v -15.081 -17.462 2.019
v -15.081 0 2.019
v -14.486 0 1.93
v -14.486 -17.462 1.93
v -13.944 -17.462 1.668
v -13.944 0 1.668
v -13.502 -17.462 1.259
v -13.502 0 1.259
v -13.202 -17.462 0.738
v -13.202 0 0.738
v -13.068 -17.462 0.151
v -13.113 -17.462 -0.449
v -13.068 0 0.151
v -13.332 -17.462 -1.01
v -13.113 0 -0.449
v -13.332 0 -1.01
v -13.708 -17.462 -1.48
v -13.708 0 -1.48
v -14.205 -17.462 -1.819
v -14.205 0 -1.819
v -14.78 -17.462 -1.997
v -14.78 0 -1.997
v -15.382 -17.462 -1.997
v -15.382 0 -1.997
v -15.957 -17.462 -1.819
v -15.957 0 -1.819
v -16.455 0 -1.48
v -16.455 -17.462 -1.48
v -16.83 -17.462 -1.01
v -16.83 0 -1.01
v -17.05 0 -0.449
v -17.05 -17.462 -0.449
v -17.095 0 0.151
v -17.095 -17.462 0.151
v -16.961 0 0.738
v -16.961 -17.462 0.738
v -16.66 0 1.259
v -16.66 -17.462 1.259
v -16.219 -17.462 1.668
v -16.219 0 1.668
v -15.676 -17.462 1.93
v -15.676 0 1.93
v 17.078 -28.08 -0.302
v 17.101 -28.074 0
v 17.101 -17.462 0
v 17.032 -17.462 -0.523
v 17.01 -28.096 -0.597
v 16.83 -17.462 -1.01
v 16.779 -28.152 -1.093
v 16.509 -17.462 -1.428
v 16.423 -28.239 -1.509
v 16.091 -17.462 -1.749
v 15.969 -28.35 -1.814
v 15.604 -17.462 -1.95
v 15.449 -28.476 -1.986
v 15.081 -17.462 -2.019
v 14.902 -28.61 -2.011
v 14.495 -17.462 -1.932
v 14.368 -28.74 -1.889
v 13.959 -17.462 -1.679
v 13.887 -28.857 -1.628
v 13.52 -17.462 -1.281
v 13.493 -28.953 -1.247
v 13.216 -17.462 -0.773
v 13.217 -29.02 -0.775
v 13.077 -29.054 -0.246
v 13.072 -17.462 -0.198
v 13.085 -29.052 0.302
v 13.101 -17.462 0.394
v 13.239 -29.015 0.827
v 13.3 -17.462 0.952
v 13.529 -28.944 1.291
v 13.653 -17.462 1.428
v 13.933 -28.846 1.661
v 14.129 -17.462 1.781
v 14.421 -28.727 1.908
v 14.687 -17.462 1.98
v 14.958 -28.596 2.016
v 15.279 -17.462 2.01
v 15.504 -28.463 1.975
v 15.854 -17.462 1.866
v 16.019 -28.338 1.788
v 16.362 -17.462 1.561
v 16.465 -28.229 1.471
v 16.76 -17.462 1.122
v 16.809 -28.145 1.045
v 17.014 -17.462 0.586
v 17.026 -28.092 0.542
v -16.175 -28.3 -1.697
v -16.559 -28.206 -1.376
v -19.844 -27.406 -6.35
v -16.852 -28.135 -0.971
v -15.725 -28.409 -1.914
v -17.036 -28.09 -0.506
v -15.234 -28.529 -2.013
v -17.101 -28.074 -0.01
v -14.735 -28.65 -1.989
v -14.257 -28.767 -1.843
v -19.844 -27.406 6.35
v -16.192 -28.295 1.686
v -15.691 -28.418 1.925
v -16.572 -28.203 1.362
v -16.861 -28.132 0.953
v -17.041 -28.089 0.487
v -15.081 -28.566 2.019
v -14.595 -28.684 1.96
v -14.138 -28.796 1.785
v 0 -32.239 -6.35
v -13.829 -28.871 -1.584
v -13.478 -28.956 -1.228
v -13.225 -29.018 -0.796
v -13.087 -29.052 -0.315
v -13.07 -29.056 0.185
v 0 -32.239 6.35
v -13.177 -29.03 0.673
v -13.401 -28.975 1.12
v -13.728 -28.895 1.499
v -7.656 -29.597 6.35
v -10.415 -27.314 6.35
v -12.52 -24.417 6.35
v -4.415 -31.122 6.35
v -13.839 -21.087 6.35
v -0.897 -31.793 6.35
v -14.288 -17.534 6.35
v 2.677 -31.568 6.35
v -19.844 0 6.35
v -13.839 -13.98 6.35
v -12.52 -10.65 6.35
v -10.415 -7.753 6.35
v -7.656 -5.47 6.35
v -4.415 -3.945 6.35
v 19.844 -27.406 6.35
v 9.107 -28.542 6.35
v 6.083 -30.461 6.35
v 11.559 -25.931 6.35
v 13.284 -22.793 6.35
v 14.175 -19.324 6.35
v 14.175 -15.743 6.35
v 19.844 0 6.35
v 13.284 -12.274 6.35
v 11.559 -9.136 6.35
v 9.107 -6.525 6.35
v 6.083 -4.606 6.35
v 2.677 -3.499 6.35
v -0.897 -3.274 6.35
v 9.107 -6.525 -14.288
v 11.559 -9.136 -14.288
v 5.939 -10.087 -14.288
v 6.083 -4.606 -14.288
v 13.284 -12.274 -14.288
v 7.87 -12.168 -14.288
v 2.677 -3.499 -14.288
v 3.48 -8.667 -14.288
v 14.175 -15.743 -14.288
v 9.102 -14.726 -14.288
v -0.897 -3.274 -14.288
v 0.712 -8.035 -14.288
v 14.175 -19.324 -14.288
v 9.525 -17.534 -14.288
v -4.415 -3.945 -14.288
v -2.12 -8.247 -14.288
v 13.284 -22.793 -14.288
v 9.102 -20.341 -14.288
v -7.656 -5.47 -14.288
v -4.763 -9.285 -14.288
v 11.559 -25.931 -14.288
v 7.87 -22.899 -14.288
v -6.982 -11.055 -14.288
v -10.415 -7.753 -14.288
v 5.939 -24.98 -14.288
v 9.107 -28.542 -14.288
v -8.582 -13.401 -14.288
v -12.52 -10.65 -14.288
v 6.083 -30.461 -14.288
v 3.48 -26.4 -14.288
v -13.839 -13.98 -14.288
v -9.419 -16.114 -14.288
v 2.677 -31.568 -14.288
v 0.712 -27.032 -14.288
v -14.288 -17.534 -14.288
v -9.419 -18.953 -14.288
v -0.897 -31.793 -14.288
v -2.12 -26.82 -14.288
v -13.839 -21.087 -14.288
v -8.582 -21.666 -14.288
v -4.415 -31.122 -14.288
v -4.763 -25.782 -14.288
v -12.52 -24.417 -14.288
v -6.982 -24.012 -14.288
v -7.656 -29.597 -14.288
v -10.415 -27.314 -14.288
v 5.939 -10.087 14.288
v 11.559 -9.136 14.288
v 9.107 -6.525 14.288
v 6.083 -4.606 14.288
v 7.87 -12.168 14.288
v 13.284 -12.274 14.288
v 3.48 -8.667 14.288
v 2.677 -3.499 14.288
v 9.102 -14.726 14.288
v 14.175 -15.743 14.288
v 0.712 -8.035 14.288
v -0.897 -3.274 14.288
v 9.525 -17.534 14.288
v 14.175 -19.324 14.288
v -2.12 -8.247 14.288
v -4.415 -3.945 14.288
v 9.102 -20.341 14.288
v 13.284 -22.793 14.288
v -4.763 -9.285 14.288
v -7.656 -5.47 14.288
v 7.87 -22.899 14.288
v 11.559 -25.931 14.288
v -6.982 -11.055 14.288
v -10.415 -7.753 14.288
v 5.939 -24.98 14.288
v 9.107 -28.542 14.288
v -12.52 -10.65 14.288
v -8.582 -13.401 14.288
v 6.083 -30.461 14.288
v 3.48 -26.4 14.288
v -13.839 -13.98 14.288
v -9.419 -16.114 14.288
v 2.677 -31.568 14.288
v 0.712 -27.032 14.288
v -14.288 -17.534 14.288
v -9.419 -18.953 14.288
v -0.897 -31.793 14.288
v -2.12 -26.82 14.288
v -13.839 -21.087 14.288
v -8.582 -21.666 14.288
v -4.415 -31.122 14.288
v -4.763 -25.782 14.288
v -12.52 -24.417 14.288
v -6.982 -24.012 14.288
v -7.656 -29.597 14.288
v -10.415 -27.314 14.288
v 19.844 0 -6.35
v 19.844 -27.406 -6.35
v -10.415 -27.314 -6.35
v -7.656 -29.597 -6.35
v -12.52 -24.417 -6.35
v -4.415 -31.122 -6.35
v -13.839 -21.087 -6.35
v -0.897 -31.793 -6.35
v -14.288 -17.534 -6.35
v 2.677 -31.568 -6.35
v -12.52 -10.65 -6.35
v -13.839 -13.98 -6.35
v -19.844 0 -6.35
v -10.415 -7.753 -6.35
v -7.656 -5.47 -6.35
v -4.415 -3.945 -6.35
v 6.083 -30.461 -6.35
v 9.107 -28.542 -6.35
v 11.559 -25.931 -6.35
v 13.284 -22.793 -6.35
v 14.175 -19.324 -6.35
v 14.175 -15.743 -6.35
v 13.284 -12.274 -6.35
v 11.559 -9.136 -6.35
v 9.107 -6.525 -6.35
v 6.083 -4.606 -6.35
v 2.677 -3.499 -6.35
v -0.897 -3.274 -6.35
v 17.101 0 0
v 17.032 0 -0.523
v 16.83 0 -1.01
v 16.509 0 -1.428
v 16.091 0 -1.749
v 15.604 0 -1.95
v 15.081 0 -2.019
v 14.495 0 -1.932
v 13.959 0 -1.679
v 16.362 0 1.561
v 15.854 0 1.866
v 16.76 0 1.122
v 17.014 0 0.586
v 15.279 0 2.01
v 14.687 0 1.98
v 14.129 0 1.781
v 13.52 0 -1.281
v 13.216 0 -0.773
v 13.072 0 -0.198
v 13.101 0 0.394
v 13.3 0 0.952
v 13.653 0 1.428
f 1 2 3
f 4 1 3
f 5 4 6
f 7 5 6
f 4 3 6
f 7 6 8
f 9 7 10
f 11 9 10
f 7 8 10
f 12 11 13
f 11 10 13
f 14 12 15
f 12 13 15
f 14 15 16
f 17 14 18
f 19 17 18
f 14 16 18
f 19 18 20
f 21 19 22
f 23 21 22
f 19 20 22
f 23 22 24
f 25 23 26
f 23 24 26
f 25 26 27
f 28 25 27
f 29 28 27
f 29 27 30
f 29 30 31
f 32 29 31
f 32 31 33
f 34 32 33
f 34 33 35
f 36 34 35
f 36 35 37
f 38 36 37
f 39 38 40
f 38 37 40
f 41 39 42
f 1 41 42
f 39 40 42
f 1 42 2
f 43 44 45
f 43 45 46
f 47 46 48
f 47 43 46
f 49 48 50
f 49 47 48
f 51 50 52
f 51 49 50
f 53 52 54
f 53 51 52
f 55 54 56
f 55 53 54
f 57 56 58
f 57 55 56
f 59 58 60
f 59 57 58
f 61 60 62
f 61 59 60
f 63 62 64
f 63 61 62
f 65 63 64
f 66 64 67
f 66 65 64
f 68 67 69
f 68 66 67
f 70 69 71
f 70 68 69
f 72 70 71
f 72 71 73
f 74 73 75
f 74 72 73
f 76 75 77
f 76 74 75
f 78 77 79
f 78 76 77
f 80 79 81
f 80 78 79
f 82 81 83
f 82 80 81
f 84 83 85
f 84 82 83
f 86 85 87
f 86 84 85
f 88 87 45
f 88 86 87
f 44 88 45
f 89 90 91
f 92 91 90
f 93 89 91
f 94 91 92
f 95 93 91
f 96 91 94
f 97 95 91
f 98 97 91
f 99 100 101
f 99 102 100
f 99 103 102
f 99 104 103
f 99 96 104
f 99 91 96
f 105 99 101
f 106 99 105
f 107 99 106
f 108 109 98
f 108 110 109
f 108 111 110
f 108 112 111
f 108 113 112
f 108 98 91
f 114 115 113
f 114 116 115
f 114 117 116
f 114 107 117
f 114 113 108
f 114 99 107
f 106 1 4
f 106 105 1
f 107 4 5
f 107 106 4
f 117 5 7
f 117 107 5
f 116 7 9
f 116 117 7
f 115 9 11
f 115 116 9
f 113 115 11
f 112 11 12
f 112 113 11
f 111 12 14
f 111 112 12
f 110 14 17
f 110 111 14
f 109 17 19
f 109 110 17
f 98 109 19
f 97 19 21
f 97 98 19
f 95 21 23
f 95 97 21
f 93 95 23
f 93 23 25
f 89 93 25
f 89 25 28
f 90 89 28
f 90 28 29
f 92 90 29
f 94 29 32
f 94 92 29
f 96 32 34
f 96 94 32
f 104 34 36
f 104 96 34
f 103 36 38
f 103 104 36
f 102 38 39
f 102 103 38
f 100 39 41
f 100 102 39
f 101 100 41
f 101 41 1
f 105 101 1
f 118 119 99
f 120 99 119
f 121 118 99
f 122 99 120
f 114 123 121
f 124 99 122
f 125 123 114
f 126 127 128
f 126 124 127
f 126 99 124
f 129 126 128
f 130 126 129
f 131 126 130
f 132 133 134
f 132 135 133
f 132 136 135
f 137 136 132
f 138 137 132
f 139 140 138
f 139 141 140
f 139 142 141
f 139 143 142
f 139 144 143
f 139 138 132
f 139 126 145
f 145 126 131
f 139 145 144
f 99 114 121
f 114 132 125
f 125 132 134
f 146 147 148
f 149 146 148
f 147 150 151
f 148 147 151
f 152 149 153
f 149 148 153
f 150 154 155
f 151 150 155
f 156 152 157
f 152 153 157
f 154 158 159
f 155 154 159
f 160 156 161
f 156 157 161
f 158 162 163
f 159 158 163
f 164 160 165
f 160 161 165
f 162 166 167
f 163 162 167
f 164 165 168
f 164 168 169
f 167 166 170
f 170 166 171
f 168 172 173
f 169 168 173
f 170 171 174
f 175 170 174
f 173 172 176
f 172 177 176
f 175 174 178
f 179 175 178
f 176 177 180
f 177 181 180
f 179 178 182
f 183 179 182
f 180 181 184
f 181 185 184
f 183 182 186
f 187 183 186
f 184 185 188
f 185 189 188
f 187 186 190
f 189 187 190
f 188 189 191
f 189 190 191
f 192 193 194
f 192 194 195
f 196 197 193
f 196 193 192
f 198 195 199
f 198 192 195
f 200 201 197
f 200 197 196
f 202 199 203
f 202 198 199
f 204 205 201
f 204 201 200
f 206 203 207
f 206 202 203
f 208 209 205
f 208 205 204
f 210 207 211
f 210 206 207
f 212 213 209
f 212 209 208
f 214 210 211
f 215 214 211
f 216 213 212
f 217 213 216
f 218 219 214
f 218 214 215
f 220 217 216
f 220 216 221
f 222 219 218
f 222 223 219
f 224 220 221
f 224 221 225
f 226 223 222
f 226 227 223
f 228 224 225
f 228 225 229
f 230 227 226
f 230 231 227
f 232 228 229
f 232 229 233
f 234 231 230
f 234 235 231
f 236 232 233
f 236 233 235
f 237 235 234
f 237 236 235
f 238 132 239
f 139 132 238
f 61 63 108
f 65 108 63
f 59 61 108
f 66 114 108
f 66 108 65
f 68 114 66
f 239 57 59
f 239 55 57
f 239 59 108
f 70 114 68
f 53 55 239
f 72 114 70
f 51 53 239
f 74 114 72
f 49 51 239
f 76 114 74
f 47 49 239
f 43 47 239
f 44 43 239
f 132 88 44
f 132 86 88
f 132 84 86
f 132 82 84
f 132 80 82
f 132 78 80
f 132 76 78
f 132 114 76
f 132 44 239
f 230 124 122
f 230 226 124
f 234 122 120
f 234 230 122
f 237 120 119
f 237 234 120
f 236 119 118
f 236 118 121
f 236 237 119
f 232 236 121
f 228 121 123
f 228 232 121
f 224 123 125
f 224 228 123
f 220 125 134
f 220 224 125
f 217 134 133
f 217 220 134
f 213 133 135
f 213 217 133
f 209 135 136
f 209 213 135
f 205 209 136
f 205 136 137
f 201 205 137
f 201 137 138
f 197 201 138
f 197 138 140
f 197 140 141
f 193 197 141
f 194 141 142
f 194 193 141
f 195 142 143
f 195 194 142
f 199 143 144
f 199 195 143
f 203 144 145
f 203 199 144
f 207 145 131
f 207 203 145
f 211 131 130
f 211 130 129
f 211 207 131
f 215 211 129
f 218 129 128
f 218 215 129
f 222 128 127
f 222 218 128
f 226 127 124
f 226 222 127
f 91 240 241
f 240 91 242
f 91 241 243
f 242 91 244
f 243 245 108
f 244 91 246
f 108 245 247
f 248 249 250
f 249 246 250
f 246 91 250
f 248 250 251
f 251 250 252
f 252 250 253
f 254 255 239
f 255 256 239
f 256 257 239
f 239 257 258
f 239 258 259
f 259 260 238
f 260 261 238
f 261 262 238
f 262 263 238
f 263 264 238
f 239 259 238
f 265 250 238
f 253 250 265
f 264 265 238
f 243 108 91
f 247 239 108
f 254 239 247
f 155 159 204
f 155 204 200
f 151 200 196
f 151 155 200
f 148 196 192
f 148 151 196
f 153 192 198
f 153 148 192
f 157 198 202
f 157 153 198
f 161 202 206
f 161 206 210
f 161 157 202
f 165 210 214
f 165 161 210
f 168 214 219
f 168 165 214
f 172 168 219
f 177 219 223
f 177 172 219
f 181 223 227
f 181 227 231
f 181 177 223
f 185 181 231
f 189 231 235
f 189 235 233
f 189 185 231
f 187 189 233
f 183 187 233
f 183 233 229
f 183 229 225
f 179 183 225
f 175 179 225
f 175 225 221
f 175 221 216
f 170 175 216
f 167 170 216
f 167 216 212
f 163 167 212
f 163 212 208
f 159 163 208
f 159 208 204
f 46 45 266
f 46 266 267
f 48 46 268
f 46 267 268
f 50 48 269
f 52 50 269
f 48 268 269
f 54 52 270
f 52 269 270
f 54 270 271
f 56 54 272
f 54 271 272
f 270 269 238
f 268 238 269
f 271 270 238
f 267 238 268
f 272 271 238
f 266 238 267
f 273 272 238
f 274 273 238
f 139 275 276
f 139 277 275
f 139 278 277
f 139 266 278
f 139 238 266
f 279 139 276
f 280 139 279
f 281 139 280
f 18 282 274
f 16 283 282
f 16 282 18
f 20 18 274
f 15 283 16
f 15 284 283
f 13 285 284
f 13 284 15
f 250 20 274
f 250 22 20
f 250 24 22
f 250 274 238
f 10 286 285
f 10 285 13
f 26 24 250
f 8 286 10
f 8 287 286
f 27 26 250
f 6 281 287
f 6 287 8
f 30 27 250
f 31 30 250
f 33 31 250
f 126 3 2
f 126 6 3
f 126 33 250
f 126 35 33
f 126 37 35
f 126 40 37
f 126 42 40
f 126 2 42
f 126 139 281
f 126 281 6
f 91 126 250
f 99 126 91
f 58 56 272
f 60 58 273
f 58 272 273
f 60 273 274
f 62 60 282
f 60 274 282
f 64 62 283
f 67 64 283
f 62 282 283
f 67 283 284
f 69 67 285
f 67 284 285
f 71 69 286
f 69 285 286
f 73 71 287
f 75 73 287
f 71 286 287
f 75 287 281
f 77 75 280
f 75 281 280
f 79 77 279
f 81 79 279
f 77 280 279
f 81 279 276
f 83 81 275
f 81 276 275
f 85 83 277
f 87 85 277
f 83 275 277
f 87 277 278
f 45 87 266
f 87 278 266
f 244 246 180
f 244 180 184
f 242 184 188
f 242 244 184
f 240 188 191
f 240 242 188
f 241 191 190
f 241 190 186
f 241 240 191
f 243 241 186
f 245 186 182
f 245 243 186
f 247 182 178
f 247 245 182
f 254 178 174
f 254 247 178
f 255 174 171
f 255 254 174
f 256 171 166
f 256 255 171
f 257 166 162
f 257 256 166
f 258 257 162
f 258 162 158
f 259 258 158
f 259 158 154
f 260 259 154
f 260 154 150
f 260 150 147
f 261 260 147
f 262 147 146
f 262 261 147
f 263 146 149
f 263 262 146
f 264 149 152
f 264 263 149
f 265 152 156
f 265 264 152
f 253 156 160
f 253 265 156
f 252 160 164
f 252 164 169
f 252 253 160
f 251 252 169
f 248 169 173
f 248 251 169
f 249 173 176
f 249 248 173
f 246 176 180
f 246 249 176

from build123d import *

# Parameters (mm, degrees)
SKETCH1_R               = 9.525
BOSS_EXTRUDE2_DEPTH     = 6.35
SKETCH2_R               = 14.2875
SKETCH2_R_2             = 9.525
BOSS_EXTRUDE3_DEPTH     = 14.2875
SKETCH6_R               = 2.0193
CUT_EXTRUDE1_DEPTH      = 17.4625
CUT_EXTRUDE2_DEPTH      = 31.047395504
CUT_EXTRUDE2_DEPTH_BACK = 31.047395504
SKETCH9_R               = 2.0193


with BuildPart() as part:
    # Sketch1 → Boss-Extrude2 (new, symmetric)
    with BuildSketch(Plane.XY):
        Polygon((19.84375, 0), (-19.84375, 0), (-19.84375, -17.4625), (-19.84375, -27.406149544), (0, -32.238619559), (19.84375, -27.406149544), (19.84375, -17.4625), align=None)
        with Locations((0, -17.533511157)):
            Circle(SKETCH1_R, mode=Mode.SUBTRACT)
    extrude(amount=BOSS_EXTRUDE2_DEPTH, both=True)

    # Sketch2 → Boss-Extrude3 (add, symmetric)
    with BuildSketch(Plane.XY):
        with Locations(Location((0, -17.533511157, 0), (0, 0, 180))):
            Circle(SKETCH2_R)
        with Locations((0, -17.533511157)):
            Circle(SKETCH2_R_2, mode=Mode.SUBTRACT)
    extrude(amount=BOSS_EXTRUDE3_DEPTH, both=True)

    # Sketch6 → Cut-Extrude1 (cut)
    with BuildSketch(Plane(origin=(0, 0, 0), x_dir=(1, 0, 0), z_dir=(0, 1, 0))):
        with Locations(Location((-15.08125, 0, 0), (0, 0, 270))):
            Circle(SKETCH6_R)
        with Locations(Location((15.08125, 0, 0), (0, 0, 90))):
            Circle(SKETCH6_R)
    extrude(amount=-CUT_EXTRUDE1_DEPTH, mode=Mode.SUBTRACT)

    # Sketch9 → Cut-Extrude2 (cut, two sides: drawn at the far end of the back side and taken through both)
    with BuildSketch(Plane(origin=(0, -17.4625, 0), x_dir=(1, 0, 0), z_dir=(0, 1, 0)).offset(-CUT_EXTRUDE2_DEPTH_BACK)):
        with Locations(Location((-15.08125, 0, 0), (0, 0, 270))):
            Circle(SKETCH9_R)
        with Locations((15.08125, 0)):
            Circle(SKETCH9_R)
    extrude(amount=CUT_EXTRUDE2_DEPTH + CUT_EXTRUDE2_DEPTH_BACK, mode=Mode.SUBTRACT)


solid = part.part
